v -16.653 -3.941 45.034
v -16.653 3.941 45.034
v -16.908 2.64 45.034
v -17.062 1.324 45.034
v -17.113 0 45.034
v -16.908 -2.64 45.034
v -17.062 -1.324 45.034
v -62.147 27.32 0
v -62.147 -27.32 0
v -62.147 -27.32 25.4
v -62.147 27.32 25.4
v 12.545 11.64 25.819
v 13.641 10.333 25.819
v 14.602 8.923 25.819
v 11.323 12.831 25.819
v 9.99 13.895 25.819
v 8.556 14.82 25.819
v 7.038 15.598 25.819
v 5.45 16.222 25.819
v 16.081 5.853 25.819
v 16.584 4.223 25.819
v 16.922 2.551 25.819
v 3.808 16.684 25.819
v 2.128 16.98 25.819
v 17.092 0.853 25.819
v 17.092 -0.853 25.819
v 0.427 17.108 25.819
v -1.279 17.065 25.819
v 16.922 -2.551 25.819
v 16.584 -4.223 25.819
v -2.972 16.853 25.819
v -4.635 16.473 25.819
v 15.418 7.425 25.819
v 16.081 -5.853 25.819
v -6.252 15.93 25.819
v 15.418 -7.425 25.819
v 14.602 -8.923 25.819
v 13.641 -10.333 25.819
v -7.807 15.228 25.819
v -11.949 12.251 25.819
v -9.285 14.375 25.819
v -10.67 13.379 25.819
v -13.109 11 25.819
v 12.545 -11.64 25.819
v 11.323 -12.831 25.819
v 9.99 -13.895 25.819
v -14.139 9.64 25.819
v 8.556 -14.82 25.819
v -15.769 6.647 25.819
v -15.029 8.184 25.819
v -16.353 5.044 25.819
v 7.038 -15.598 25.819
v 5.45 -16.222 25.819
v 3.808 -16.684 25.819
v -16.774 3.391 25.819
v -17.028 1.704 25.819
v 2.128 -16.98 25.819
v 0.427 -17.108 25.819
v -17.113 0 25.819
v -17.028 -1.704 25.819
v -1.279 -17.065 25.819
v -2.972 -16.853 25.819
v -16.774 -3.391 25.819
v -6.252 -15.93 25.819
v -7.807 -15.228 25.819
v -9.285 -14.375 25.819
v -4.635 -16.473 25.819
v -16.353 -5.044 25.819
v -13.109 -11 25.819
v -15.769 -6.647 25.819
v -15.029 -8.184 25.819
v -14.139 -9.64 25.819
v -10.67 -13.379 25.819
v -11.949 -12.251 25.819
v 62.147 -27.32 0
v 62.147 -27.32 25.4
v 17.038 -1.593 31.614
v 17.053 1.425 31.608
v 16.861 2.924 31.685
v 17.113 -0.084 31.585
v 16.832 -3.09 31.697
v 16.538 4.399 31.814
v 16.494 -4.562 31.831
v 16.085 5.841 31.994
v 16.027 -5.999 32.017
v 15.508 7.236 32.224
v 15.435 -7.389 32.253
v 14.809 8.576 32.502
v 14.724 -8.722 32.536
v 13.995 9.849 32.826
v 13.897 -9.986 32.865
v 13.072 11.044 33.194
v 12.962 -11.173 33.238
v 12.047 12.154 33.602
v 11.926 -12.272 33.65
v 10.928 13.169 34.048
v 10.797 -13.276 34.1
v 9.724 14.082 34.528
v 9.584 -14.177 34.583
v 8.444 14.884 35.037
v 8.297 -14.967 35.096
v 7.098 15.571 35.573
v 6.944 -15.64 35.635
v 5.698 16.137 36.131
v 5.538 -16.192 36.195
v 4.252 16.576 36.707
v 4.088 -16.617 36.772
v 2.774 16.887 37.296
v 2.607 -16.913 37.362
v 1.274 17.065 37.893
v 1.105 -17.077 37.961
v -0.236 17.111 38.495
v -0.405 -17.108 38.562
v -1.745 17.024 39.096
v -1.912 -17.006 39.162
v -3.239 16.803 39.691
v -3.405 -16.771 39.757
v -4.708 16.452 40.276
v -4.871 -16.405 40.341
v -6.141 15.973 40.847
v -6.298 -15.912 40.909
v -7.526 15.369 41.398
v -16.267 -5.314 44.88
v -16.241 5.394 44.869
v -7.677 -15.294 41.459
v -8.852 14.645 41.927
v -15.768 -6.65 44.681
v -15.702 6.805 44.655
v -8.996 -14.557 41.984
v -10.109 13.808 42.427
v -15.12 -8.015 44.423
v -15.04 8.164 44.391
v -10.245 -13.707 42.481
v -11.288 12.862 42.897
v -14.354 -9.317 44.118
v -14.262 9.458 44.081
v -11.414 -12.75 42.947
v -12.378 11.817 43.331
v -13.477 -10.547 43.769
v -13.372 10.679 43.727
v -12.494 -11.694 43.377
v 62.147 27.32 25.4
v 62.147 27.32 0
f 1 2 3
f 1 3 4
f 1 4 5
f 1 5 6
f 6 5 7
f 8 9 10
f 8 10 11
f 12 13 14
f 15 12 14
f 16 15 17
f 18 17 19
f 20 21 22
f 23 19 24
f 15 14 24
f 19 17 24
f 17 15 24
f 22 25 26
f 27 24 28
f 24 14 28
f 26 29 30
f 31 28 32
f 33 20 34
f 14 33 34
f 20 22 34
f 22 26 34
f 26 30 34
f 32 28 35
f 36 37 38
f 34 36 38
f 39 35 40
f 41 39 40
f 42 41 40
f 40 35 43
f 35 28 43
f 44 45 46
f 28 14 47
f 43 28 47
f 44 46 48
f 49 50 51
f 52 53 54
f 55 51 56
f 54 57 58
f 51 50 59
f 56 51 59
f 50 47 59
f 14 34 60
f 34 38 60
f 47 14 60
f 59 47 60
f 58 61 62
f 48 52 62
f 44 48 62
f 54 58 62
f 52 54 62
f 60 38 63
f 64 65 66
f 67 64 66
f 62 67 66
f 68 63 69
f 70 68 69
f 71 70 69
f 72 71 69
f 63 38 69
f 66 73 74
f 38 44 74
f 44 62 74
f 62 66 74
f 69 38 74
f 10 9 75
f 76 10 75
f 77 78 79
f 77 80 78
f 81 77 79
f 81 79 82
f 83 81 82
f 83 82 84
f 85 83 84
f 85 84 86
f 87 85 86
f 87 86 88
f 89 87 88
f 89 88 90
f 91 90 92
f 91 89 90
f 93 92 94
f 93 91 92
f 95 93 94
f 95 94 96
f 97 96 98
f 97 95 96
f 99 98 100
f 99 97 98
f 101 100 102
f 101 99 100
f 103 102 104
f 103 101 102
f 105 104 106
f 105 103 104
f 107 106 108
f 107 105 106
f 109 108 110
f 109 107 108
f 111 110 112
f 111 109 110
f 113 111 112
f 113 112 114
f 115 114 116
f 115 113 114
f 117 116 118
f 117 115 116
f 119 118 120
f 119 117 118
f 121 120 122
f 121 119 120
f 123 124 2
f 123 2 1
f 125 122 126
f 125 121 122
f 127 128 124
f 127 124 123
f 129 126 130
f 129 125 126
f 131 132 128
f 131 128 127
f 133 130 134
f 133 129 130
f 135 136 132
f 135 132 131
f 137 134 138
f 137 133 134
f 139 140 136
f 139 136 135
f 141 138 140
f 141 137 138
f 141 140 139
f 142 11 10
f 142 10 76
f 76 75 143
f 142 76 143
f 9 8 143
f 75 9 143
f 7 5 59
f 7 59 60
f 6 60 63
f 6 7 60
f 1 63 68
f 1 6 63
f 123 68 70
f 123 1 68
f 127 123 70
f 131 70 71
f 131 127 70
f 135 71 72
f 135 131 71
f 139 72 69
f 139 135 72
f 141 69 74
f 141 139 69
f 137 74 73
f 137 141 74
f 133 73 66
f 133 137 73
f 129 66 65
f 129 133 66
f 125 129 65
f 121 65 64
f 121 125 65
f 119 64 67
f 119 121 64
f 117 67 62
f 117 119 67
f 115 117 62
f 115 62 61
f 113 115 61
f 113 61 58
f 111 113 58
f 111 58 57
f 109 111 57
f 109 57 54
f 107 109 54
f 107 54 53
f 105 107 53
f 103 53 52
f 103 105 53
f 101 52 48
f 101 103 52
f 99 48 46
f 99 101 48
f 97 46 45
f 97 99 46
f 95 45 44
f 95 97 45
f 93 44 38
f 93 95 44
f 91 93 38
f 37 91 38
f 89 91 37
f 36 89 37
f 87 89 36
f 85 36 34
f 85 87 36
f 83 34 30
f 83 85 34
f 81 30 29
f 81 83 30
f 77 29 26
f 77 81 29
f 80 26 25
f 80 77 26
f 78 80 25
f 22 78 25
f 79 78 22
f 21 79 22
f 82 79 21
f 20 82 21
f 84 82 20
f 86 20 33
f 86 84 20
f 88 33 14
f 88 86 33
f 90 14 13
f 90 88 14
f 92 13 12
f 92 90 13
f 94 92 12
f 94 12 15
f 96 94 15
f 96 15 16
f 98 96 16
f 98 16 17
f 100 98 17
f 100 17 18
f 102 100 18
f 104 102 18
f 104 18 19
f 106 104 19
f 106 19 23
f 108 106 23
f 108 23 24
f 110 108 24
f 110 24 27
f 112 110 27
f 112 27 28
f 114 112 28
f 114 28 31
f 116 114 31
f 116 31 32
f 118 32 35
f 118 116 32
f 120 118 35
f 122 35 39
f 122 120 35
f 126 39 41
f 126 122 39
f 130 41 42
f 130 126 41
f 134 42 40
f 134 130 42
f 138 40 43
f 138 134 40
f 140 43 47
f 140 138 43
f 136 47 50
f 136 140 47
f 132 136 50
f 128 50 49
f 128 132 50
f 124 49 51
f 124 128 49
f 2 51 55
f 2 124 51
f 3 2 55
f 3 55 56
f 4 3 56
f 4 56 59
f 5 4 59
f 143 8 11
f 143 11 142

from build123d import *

# Parameters (mm, degrees)
F0_W     = 124.2932081223
F0_H     = 54.6409748495
F1_DEPTH = 25.4
F2_W     = 17.1128325164
F2_H     = 19.2144084722


with BuildPart() as f1:
    # F0 (on Top) → F1 (new body)
    with BuildSketch(Plane.XY):
        Rectangle(F0_W, F0_H)
    extrude(amount=F1_DEPTH)


with BuildPart() as f3:
    # F2 (on Front) → F3 (revolve)
    with BuildSketch(Plane.XZ):
        with Locations((-8.5564162582, 35.4265673086)):
            Rectangle(F2_W, F2_H)
    revolve(axis=Axis((0, 0, 35.4265673086), (0, 0, 1)))

    # F4 (on Front) → F5 (revolve, cut)
    with BuildSketch(Plane.XZ):
        Polygon((-6.151519385, 77.976520624), (-18.9141836017, 45.9344498813), (23.8189133723, 28.9134473375), (36.5815775891, 60.9555180802), align=None)
    revolve(axis=Axis((-12.5328514934, 0, 61.9554852527), (-0.3700364751, 0, -0.9290172265)), mode=Mode.SUBTRACT)


solid = Compound([f1.part, f3.part])
